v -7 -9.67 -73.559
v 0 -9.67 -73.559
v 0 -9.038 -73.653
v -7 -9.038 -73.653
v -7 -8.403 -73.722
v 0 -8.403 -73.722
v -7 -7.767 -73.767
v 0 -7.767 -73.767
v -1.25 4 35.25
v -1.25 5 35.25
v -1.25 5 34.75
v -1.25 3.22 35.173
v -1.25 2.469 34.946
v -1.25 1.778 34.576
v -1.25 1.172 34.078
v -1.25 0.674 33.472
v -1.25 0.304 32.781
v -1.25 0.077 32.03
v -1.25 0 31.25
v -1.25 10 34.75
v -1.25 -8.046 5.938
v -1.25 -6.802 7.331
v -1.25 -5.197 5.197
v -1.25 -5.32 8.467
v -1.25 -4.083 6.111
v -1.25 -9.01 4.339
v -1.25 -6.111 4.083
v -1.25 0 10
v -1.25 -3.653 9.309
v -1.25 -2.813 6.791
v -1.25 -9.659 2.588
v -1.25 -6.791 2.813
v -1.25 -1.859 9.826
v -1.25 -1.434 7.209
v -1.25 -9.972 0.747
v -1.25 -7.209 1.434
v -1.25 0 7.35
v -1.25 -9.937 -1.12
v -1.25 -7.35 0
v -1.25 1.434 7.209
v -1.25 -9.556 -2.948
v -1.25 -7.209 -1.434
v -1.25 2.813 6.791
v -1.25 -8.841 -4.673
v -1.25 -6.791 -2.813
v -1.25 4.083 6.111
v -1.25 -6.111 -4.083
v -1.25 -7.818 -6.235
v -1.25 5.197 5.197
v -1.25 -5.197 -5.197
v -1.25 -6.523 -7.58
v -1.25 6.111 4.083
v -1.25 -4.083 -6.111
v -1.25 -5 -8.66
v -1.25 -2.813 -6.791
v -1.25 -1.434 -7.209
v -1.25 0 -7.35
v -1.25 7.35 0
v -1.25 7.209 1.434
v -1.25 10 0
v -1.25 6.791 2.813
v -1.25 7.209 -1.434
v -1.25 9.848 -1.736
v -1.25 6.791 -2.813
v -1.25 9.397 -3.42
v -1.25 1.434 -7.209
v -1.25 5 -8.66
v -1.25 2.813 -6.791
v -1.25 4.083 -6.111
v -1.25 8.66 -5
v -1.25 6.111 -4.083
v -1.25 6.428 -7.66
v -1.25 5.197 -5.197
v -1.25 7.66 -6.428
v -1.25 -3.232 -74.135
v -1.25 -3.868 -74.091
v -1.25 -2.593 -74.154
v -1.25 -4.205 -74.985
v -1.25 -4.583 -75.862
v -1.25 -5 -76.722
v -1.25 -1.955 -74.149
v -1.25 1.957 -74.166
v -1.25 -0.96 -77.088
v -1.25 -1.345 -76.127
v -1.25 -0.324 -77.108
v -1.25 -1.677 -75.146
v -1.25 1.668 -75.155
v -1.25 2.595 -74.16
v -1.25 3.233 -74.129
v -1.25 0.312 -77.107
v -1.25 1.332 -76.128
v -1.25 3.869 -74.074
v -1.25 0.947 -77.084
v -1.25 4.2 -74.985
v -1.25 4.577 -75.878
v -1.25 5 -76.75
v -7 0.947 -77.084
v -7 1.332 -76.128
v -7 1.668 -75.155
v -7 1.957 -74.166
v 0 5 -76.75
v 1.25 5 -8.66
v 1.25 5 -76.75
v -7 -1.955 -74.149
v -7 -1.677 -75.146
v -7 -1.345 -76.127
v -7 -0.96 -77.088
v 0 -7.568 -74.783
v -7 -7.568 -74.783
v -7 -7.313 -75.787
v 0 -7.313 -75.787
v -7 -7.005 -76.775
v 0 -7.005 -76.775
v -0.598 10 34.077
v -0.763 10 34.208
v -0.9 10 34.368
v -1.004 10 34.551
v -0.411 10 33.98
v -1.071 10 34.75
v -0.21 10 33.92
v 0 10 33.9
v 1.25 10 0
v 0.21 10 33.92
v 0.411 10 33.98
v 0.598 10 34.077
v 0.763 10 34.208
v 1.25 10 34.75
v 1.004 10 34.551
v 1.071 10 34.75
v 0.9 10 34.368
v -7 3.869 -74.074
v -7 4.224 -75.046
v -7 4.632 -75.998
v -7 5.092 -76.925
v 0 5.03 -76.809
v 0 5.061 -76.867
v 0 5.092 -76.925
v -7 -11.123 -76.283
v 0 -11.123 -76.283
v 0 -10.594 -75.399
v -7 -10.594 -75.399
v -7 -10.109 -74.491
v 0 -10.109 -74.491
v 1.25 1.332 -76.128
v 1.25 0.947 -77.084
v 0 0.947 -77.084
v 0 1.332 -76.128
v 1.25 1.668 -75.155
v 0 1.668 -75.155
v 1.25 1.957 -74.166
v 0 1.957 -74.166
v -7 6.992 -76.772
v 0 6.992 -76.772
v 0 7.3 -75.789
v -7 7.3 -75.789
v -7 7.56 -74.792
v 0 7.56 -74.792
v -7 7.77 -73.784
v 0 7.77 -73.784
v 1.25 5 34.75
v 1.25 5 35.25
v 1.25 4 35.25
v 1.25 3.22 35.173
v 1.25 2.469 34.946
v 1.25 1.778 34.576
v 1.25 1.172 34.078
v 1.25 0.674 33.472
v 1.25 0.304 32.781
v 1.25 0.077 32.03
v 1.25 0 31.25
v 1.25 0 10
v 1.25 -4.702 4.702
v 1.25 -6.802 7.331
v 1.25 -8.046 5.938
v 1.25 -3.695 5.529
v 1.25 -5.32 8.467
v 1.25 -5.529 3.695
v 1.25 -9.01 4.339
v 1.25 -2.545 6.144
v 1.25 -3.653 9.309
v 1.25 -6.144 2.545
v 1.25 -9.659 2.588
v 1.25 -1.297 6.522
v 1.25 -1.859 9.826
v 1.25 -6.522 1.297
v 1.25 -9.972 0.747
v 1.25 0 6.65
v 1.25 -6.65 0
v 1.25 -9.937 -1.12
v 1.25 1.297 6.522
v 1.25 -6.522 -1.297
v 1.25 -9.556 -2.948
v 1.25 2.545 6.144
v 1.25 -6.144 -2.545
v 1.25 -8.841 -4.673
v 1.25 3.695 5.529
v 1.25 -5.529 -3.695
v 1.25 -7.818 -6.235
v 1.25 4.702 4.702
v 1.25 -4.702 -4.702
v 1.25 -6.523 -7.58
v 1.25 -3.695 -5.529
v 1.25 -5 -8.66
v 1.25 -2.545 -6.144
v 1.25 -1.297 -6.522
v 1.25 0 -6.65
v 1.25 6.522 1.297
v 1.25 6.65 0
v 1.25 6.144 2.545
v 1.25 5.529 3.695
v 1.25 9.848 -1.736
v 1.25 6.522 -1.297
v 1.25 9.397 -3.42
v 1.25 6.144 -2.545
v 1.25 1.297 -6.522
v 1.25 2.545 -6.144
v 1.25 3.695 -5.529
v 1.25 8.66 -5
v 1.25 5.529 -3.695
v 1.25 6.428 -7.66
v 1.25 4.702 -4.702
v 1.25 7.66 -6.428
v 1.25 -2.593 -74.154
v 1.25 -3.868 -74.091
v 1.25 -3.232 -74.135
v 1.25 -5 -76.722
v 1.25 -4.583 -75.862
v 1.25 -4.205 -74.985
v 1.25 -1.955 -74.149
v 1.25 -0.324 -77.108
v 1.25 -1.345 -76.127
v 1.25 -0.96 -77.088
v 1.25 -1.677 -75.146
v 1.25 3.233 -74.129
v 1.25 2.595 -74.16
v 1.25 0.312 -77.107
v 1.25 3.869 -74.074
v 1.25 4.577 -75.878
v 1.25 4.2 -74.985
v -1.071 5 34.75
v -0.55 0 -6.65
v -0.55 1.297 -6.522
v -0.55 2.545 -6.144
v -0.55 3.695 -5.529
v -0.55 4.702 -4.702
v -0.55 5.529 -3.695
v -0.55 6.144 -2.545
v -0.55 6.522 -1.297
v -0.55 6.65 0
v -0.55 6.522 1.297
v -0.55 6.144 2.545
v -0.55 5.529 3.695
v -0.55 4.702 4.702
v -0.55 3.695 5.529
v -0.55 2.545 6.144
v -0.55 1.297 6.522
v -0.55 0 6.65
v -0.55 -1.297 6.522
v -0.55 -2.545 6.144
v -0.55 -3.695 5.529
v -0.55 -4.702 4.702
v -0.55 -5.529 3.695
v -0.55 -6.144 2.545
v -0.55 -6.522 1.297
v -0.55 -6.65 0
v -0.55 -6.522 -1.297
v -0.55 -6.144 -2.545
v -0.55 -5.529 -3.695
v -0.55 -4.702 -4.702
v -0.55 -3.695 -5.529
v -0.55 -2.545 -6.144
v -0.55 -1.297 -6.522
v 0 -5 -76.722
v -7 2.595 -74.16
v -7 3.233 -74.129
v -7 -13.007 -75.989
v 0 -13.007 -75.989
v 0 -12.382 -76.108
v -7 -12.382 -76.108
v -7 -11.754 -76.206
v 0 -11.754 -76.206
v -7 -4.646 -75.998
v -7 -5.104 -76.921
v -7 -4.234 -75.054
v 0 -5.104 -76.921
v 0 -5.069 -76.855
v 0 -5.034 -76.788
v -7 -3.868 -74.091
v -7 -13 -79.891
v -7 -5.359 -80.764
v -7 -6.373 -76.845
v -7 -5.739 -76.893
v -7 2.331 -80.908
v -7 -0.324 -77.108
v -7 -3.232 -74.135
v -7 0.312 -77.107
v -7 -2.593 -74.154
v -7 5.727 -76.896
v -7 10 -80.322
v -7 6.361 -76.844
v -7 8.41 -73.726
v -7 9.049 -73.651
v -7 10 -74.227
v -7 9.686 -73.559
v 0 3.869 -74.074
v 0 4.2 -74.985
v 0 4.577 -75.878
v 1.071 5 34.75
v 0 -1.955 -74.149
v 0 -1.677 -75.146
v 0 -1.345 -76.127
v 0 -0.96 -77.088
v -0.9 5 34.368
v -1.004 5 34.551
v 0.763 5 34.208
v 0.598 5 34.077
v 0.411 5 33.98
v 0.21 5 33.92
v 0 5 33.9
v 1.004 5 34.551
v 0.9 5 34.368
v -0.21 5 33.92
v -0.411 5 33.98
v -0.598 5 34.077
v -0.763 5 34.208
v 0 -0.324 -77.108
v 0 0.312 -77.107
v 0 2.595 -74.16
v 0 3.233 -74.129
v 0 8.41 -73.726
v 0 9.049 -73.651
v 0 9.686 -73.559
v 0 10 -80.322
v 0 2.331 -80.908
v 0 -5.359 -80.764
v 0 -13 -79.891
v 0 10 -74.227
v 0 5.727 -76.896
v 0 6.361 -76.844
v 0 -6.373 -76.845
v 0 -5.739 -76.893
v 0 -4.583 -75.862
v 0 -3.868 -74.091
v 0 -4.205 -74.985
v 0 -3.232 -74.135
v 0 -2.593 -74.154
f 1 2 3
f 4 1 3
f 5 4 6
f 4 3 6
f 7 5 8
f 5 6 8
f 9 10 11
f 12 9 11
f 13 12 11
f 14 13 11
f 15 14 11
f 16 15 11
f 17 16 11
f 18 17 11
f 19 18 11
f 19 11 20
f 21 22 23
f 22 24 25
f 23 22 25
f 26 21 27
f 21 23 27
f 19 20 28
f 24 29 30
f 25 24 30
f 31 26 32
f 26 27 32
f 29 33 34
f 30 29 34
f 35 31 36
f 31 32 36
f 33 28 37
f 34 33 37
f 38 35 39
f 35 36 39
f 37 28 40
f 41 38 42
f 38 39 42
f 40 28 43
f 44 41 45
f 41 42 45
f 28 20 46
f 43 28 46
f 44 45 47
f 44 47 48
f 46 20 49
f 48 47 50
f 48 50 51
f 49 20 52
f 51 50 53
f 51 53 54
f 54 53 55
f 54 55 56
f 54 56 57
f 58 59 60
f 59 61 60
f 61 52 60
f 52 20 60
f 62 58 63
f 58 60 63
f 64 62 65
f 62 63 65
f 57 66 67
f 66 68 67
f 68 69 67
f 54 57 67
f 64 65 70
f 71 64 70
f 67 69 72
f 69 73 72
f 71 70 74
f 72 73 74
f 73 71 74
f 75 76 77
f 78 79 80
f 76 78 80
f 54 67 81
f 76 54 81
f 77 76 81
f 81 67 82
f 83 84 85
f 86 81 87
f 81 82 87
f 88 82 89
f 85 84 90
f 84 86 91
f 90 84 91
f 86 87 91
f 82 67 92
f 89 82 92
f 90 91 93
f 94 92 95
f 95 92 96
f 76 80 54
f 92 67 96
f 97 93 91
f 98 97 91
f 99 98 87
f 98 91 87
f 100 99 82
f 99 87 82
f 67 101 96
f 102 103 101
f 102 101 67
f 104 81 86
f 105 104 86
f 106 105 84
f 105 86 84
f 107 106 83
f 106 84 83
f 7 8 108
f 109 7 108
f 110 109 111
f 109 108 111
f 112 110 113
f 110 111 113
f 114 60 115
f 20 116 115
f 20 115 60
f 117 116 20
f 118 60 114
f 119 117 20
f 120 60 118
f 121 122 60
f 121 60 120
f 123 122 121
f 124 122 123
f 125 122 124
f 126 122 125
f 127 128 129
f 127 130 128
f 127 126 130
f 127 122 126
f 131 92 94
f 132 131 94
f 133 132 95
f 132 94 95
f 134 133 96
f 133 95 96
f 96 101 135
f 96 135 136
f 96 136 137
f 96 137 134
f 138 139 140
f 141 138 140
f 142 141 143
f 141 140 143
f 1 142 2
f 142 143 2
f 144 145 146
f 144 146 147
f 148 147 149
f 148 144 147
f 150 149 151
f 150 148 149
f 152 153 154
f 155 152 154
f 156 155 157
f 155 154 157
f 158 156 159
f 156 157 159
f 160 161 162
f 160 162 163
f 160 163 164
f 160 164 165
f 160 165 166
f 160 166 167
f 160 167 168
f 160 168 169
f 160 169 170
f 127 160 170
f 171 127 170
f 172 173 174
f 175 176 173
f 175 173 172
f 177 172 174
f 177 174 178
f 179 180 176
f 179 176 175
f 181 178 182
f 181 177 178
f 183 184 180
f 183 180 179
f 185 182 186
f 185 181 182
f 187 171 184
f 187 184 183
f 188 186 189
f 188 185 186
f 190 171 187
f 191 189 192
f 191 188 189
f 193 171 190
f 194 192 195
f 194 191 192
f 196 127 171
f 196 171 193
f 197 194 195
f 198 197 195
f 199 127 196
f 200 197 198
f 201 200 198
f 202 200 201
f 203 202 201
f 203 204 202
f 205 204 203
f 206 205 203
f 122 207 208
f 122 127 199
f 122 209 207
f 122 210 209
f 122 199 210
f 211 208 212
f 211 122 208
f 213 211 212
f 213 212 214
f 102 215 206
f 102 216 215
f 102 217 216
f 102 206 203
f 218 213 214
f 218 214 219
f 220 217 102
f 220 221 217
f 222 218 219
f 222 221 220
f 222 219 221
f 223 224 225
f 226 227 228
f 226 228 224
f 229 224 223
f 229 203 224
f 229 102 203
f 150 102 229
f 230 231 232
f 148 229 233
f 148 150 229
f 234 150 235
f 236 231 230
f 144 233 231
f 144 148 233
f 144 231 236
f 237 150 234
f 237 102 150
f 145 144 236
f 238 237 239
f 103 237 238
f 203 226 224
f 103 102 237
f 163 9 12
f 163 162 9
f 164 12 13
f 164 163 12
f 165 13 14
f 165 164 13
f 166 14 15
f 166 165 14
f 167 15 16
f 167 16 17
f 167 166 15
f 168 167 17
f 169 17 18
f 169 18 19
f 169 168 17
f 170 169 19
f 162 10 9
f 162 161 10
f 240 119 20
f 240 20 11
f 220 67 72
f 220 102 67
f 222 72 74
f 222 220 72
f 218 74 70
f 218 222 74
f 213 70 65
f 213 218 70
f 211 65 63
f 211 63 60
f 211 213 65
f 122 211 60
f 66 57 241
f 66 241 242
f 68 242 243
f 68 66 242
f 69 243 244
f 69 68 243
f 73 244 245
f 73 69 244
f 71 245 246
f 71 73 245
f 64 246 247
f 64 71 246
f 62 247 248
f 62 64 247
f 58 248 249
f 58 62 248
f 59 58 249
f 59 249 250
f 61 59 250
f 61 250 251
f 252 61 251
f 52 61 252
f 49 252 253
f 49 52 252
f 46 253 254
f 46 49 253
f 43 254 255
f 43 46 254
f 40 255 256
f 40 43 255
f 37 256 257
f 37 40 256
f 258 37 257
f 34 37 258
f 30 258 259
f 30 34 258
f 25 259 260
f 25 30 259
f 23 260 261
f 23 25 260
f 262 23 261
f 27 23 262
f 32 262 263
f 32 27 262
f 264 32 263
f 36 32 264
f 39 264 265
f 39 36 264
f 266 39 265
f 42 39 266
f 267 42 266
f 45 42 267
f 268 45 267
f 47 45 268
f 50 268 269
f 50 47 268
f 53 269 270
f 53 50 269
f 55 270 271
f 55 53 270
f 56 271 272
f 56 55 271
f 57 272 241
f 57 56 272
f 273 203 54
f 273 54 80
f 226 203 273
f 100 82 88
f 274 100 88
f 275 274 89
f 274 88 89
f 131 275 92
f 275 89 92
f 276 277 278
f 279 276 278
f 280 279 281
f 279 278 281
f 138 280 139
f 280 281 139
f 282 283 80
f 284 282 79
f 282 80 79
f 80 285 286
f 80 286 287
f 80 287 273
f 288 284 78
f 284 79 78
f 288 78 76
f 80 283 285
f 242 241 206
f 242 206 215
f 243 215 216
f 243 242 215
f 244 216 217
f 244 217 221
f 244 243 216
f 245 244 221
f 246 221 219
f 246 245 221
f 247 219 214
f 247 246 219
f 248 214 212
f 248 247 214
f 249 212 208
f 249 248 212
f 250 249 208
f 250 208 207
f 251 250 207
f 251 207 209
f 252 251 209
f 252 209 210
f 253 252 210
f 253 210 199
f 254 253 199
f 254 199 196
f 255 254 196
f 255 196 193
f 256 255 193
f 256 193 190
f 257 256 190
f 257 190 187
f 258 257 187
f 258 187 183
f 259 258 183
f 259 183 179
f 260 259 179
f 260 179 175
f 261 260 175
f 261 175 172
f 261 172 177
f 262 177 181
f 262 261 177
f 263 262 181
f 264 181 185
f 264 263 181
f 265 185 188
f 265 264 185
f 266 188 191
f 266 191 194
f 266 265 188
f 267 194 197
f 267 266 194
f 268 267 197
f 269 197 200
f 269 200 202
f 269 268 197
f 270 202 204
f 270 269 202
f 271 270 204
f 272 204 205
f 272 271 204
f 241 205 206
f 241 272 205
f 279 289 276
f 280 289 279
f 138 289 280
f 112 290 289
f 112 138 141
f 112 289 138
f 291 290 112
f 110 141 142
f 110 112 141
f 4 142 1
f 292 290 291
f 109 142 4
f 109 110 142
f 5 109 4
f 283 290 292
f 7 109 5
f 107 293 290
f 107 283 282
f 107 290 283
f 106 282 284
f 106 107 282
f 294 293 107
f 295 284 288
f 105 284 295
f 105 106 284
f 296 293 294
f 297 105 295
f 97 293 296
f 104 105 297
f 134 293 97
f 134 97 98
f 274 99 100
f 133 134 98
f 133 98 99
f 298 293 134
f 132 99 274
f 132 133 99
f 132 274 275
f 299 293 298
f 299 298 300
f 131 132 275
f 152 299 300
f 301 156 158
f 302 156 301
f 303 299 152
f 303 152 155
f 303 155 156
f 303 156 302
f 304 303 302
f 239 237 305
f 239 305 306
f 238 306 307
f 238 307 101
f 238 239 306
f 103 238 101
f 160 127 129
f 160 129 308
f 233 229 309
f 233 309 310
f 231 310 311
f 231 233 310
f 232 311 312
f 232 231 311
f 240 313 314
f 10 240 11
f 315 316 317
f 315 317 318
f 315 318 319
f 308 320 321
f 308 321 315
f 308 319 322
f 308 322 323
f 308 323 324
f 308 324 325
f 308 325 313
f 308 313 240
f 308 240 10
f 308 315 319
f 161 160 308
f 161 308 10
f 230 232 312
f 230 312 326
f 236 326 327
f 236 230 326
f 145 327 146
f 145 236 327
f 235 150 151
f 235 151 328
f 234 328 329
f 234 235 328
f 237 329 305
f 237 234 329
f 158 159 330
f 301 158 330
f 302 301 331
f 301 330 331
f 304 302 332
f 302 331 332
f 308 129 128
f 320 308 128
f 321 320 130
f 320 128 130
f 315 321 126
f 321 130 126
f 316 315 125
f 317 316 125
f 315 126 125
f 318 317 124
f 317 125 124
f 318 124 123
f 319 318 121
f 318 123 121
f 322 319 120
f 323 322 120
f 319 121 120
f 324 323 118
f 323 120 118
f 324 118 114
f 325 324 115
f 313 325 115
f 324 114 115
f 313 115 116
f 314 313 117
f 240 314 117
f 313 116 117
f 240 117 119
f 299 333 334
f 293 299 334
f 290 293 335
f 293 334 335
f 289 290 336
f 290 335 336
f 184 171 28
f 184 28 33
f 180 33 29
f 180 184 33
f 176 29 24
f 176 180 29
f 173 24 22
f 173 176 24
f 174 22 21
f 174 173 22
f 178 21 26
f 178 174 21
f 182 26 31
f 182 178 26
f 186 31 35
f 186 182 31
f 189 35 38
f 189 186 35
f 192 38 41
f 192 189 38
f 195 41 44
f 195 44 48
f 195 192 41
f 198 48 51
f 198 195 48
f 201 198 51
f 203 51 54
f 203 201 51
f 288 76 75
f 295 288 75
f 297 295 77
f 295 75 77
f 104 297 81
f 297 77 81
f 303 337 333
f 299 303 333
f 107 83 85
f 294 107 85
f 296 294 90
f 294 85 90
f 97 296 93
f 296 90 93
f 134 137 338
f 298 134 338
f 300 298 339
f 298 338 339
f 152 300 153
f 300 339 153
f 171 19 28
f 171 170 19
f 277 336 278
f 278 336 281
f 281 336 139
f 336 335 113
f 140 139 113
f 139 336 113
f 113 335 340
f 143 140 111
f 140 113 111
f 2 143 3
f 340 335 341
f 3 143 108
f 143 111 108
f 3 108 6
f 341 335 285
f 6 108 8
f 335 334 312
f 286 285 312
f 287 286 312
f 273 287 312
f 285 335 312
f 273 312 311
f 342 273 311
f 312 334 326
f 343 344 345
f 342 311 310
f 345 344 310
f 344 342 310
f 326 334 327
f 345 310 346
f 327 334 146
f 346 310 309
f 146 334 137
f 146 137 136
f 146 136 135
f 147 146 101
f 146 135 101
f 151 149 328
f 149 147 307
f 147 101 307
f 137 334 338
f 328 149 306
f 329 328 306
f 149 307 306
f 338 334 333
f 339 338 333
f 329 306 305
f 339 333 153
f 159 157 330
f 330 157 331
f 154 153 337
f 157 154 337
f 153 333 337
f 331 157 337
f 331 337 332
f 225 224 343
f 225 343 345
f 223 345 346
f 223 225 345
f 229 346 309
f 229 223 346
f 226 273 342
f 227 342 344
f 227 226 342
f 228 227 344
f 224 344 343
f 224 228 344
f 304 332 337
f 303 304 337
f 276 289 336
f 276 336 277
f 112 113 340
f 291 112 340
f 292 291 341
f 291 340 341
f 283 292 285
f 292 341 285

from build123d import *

# Parameters (mm, degrees)
SKETCH_1_R          = 6.65
EXTRUDE_1_DEPTH     = 1.25
EXTRUDE_2_DEPTH     = 7
SKETCH_3_R          = 1.1
CUT_EXTRUDE_1_DEPTH = 5
CHAMFER_1_SIZE      = 0.7


with BuildPart() as part:
    # Эскиз1 → Бобышка-Вытянуть1 (new, symmetric)
    with BuildSketch(Plane(origin=(0, 0, 0), x_dir=(0, 0, -1), z_dir=(1, 0, 0))):
        with BuildLine():
            Line((-31.25, 0), (-10, 0))
            ThreePointArc((-10, 0), (-2.588190451, -9.659258263), (8.660254038, -5))
            Line((8.660254038, -5), (76.721847542, -5))
            ThreePointArc((76.721847542, -5), (75.425886146, -4.389181279), (74.09117429, -3.868451302))
            ThreePointArc((74.09117429, -3.868451302), (74.147561595, -2.912548148), (74.149130868, -1.954984622))
            ThreePointArc((74.149130868, -1.954984622), (75.638846987, -1.51744657), (77.087831178, -0.959648686))
            ThreePointArc((77.087831178, -0.959648686), (77.109856091, -0.006099484), (77.083941958, 0.947351948))
            ThreePointArc((77.083941958, 0.947351948), (75.643750299, 1.505844774), (74.166291118, 1.956600379))
            ThreePointArc((74.166291118, 1.956600379), (74.147505302, 2.913980899), (74.073940169, 3.8687157))
            ThreePointArc((74.073940169, 3.8687157), (75.433826566, 4.383081961), (76.750365892, 5))
            Line((76.750365892, 5), (8.660254038, 5))
            ThreePointArc((8.660254038, 5), (5, 8.660254038), (0, 10))
            Line((0, 10), (-34.75, 10))
            Line((-34.75, 10), (-34.75, 5))
            Line((-34.75, 5), (-35.25, 5))
            Line((-35.25, 5), (-35.25, 4))
            ThreePointArc((-35.25, 4), (-34.078427125, 1.171572875), (-31.25, 0))
        make_face()
        Circle(SKETCH_1_R, mode=Mode.SUBTRACT)
    extrude(amount=EXTRUDE_1_DEPTH, both=True)

    # Эскиз1<5> → Бобышка-Вытянуть2 (add)
    with BuildSketch(Plane(origin=(0, 0, 0), x_dir=(0, 0, -1), z_dir=(1, 0, 0))):
        with BuildLine():
            Line((73.559260736, 9.685830974), (74.227172899, 10))
            Line((74.227172899, 10), (80.32185029, 10))
            ThreePointArc((80.32185029, 10), (80.927765714, -1.515378033), (79.891173693, -13))
            Line((79.891173693, -13), (75.988629927, -13.007027449))
            ThreePointArc((75.988629927, -13.007027449), (76.159551637, -12.068663477), (76.283109214, -11.12289675))
            ThreePointArc((76.283109214, -11.12289675), (74.948016231, -10.345984286), (73.559260736, -9.669652694))
            ThreePointArc((73.559260736, -9.669652694), (73.690473514, -8.721120367), (73.767167518, -7.766631814))
            ThreePointArc((73.767167518, -7.766631814), (75.28662018, -7.447324325), (76.774901953, -7.004931935))
            ThreePointArc((76.774901953, -7.004931935), (76.871673579, -6.056050262), (76.920646267, -5.103504803))
            ThreePointArc((76.920646267, -5.103504803), (75.528713081, -4.433737489), (74.09117429, -3.868451302))
            ThreePointArc((74.09117429, -3.868451302), (74.147561595, -2.912548148), (74.149130868, -1.954984622))
            ThreePointArc((74.149130868, -1.954984622), (75.638846987, -1.51744657), (77.087831178, -0.959648686))
            ThreePointArc((77.087831178, -0.959648686), (77.109856091, -0.006099484), (77.083941958, 0.947351948))
            ThreePointArc((77.083941958, 0.947351948), (75.643750299, 1.505844774), (74.166291118, 1.956600379))
            ThreePointArc((74.166291118, 1.956600379), (74.147505302, 2.913980899), (74.073940169, 3.8687157))
            ThreePointArc((74.073940169, 3.8687157), (75.524735151, 4.421786748), (76.925488289, 5.091551117))
            ThreePointArc((76.925488289, 5.091551117), (76.872630699, 6.043888899), (76.771989513, 6.992367959))
            ThreePointArc((76.771989513, 6.992367959), (75.292418643, 7.436143003), (73.784148097, 7.769588967))
            ThreePointArc((73.784148097, 7.769588967), (73.691130431, 8.729989779), (73.559260736, 9.685830974))
        make_face()
    extrude(amount=-EXTRUDE_2_DEPTH)

    # Эскиз3 → Вырез-Вытянуть1 (cut)
    with BuildSketch(Plane(origin=(0, 10, 0), x_dir=(1, 0, 0), z_dir=(0, 1, 0))):
        with Locations((0, -35)):
            Circle(SKETCH_3_R)
    extrude(amount=-CUT_EXTRUDE_1_DEPTH, mode=Mode.SUBTRACT)

    # Фаска1
    chamfer_1_edges = [part.edges().sort_by_distance(p)[0] for p in [
        (-1.25, 0, 6.65),
    ]]
    chamfer(chamfer_1_edges, length=CHAMFER_1_SIZE)


solid = part.part
